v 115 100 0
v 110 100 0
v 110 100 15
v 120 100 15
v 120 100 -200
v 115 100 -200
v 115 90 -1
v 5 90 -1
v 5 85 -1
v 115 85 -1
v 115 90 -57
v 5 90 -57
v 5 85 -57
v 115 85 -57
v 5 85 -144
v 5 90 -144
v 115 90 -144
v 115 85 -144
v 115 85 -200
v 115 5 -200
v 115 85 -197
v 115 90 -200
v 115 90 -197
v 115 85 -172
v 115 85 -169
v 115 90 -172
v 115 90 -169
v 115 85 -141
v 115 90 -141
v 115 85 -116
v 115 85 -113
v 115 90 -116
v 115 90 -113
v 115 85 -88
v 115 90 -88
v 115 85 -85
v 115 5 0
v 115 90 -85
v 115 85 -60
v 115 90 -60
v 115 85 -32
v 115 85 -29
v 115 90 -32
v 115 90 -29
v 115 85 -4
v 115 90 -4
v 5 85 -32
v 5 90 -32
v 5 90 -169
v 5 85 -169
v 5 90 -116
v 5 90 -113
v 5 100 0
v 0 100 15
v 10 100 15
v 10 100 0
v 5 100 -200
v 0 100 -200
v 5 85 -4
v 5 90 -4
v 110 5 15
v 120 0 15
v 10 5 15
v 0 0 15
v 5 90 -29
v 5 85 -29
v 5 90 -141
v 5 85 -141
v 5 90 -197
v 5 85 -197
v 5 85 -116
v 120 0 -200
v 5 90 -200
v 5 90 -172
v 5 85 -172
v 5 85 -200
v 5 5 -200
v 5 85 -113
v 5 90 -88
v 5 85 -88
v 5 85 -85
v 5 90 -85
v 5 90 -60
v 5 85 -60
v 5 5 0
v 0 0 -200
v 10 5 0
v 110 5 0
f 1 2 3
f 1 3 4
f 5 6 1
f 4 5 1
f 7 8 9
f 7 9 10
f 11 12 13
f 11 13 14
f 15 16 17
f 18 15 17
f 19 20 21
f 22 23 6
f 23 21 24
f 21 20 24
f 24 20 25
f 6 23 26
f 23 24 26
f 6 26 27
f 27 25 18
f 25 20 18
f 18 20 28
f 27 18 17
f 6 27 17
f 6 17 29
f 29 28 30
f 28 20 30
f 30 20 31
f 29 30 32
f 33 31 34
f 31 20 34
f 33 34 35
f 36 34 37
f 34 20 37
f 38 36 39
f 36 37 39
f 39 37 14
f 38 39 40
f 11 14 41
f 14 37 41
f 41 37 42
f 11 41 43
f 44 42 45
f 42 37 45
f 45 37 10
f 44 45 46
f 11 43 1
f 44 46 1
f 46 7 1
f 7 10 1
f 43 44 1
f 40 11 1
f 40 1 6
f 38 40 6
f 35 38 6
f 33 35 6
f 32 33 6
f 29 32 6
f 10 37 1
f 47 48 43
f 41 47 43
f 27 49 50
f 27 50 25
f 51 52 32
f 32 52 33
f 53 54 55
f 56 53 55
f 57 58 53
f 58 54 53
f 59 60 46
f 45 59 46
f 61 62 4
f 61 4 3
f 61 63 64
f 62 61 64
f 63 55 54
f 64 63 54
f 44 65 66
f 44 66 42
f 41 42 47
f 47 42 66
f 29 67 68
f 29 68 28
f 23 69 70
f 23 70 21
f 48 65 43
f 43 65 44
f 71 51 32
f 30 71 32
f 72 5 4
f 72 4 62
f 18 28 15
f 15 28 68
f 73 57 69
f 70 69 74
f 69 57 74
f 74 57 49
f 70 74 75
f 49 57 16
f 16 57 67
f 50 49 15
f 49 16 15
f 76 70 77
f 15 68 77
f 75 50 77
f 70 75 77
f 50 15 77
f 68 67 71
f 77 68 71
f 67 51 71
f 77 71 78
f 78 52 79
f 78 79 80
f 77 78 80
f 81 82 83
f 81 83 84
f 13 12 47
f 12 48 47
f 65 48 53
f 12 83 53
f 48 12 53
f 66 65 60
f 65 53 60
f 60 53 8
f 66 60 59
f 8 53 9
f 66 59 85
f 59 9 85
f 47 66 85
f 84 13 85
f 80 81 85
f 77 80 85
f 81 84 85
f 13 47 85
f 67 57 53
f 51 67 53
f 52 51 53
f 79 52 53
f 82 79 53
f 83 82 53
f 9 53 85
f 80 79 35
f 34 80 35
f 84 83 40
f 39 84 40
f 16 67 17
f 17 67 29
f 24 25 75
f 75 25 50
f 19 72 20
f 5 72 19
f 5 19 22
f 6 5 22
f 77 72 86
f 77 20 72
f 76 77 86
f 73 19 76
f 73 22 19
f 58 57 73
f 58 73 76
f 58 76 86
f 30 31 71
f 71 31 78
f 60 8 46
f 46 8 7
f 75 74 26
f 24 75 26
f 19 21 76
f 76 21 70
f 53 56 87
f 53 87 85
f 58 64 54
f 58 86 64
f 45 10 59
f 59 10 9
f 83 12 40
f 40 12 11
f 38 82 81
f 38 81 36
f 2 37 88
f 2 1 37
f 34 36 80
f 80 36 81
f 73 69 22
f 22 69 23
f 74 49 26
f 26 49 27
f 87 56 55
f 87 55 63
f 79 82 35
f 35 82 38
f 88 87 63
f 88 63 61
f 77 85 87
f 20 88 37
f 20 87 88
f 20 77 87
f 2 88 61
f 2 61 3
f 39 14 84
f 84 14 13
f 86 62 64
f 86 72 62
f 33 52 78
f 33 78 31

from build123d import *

# Parameters (mm, degrees)
BOSS_EXTRUDE1_DEPTH = 200
SKETCH2_W           = 110
SKETCH2_H           = 25
CUT_EXTRUDE1_DEPTH  = 50
BOSS_EXTRUDE2_DEPTH = 15


with BuildPart() as part:
    # Sketch1 → Boss-Extrude1 (new body)
    with BuildSketch(Plane.XY):
        Polygon((0, 5), (0, 0), (120, 0), (120, 5.000009832), (120, 85.000009832), (120, 90), (120, 100), (115, 100), (115, 90), (5, 90), (5, 100), (0, 100), (0, 90), (0, 85), align=None)
        Polygon((115, 45.000009832), (115, 5.000009832), (5, 5.000009832), (5, 45.000009832), (5, 50.000009832), (5, 85.000009832), (115, 85.000009832), (115, 50.000009832), align=None, mode=Mode.SUBTRACT)
    extrude(amount=-BOSS_EXTRUDE1_DEPTH)

    # Sketch2 → Cut-Extrude1 (cut)
    with BuildSketch(Plane(origin=(0, 90, 0), x_dir=(1, 0, 0), z_dir=(0, 1, 0))):
        with Locations((60, 184.5)):
            Rectangle(SKETCH2_W, SKETCH2_H)
        with Locations((60, 156.5)):
            Rectangle(SKETCH2_W, SKETCH2_H)
        with Locations((60, 128.5)):
            Rectangle(SKETCH2_W, SKETCH2_H)
        with Locations((60, 100.5)):
            Rectangle(SKETCH2_W, SKETCH2_H)
        with Locations((60, 72.5)):
            Rectangle(SKETCH2_W, SKETCH2_H)
        with Locations((60, 44.5)):
            Rectangle(SKETCH2_W, SKETCH2_H)
        with Locations((60, 16.5)):
            Rectangle(SKETCH2_W, SKETCH2_H)
        with Locations((60, -11.5)):
            Rectangle(SKETCH2_W, SKETCH2_H)
    extrude(amount=-CUT_EXTRUDE1_DEPTH, mode=Mode.SUBTRACT)

    # Sketch3 → Boss-Extrude2 (add)
    with BuildSketch(Plane.XY):
        Polygon((0, 100), (10, 100), (10, 5.000009832), (110, 5.000009832), (110, 100), (120, 100), (120, 0), (0, 0), align=None)
    extrude(amount=BOSS_EXTRUDE2_DEPTH)


solid = part.part
